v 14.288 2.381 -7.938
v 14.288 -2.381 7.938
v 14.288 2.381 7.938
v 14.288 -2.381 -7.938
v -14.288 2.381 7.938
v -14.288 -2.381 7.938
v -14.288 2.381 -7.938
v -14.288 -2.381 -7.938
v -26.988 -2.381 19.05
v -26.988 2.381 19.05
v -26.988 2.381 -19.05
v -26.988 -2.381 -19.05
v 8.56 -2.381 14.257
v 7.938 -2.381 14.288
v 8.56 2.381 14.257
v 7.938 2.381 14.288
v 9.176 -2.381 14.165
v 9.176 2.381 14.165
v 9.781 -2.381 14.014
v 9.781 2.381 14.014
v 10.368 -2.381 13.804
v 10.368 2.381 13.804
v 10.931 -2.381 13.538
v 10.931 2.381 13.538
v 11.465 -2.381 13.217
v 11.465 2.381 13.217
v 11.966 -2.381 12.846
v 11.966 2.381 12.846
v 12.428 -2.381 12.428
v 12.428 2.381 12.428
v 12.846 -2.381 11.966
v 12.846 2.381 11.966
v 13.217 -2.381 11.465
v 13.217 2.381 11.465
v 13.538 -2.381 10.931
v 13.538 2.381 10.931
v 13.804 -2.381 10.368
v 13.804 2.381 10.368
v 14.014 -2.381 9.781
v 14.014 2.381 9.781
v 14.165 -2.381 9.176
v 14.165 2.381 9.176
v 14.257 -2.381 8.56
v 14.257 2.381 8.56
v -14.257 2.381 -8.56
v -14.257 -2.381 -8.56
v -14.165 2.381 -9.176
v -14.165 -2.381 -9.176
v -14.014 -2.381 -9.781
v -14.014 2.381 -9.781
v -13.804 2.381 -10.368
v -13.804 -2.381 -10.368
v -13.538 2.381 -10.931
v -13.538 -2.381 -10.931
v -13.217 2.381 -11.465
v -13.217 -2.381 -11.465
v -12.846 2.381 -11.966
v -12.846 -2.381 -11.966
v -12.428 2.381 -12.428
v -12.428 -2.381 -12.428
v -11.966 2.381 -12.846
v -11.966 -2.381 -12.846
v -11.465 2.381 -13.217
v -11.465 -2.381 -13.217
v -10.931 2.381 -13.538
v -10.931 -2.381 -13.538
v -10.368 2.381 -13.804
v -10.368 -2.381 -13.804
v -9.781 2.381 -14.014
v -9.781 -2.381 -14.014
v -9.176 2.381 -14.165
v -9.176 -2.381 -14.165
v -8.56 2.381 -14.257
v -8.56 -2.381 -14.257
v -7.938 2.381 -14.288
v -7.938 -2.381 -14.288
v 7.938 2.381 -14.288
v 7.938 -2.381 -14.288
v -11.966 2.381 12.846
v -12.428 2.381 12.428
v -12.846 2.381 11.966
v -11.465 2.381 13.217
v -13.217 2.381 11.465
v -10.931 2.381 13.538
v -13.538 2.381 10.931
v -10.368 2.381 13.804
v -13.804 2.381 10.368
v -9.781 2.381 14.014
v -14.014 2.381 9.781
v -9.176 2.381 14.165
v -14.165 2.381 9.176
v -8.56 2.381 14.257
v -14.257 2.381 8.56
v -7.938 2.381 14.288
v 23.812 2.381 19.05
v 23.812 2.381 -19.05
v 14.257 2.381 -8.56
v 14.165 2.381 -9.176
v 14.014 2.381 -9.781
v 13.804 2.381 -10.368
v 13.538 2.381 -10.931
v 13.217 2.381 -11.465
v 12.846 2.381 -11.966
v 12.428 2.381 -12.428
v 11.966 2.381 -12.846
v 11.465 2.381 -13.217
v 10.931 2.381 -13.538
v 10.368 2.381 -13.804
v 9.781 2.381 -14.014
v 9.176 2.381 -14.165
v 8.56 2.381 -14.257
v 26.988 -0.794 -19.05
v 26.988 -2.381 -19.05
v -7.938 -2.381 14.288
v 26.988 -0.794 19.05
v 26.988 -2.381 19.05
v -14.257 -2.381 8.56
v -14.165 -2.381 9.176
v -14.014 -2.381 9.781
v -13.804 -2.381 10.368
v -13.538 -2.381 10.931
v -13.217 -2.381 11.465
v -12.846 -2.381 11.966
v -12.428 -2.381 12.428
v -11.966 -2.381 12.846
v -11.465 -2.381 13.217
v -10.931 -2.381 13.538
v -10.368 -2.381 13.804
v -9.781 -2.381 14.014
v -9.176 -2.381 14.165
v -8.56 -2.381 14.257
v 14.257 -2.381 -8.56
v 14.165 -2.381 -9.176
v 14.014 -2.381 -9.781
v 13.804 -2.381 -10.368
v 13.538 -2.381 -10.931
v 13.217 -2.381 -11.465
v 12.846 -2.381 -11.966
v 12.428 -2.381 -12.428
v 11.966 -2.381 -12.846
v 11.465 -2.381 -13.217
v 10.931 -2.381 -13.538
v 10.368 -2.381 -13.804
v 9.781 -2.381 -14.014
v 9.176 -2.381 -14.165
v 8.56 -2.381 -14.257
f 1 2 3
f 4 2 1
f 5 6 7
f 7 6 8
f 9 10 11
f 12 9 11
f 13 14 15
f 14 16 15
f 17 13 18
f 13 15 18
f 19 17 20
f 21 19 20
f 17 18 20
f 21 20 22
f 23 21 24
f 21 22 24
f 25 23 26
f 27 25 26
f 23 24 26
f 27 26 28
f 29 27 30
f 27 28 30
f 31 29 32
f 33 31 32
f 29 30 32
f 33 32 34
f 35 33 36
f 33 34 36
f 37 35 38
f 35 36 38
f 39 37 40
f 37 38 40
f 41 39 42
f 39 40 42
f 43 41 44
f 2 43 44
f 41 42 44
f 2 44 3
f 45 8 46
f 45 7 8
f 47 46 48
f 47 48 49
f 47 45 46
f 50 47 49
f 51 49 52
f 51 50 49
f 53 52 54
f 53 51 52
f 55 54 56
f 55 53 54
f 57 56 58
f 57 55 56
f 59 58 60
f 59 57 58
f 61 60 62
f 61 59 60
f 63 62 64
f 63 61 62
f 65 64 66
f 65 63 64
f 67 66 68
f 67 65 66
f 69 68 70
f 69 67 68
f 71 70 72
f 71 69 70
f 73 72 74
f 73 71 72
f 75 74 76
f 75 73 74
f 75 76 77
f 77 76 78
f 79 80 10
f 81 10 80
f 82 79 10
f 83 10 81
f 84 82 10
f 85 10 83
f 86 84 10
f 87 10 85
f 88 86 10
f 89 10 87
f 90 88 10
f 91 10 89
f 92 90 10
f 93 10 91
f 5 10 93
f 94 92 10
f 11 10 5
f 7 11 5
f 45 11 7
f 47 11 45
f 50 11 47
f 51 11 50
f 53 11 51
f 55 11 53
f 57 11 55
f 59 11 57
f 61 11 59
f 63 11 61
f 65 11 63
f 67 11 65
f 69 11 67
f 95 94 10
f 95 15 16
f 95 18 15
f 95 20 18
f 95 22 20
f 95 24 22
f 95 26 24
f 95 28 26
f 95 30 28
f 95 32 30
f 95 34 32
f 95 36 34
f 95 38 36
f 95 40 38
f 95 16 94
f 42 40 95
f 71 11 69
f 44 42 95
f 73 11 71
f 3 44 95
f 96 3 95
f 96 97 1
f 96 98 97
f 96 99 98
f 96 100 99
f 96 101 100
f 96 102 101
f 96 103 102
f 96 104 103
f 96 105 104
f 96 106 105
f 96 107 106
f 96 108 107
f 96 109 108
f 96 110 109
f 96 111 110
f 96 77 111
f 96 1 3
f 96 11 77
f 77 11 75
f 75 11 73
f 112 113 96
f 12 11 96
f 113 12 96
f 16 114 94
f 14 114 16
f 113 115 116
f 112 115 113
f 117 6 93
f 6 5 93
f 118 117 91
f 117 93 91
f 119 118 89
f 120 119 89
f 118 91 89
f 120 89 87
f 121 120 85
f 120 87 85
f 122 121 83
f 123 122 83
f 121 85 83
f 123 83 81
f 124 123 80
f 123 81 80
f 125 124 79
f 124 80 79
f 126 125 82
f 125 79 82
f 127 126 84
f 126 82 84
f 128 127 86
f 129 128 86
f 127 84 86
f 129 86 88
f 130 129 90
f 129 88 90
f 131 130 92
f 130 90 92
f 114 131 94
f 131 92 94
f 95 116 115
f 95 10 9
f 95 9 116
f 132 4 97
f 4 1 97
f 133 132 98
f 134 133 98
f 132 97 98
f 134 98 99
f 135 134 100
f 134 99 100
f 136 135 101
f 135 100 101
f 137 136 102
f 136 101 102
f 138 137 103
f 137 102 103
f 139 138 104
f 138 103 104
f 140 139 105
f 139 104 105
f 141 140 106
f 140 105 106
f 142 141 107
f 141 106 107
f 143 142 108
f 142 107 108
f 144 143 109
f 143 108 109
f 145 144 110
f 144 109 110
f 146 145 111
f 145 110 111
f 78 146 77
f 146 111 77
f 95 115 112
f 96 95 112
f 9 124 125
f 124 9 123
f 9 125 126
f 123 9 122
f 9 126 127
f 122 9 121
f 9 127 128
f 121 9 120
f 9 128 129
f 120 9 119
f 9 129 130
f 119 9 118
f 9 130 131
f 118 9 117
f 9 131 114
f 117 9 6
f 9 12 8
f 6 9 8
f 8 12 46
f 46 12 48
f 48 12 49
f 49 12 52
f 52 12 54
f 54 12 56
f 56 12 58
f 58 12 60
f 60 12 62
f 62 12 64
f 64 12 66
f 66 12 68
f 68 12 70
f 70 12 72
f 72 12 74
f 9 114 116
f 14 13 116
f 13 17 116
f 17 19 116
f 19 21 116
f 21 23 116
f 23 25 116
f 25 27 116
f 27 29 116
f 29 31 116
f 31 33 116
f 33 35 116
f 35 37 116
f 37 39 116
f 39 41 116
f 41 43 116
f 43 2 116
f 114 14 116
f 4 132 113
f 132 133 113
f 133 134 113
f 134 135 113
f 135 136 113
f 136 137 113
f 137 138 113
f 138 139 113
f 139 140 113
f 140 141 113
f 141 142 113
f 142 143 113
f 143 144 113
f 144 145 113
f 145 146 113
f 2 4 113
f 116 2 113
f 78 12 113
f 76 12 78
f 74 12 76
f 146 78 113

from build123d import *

# Parameters (mm, degrees)
SKETCH1_W               = 53.975
SKETCH1_H               = 38.1
BOSS_EXTRUDE1_DEPTH     = 2.38125
CHAMFER1_SIZE           = 3.175
CUT_EXTRUDE1_DEPTH      = 34.375276216
CUT_EXTRUDE1_DEPTH_BACK = 34.375276216
SKETCH4_W               = 28.575
SKETCH4_H               = 28.575
FILLET1_R               = 6.35


with BuildPart() as part:
    # Sketch1 → Boss-Extrude1 (new, symmetric)
    with BuildSketch(Plane(origin=(0, 0, 0), x_dir=(1, 0, 0), z_dir=(0, 1, 0))):
        Rectangle(SKETCH1_W, SKETCH1_H)
    extrude(amount=BOSS_EXTRUDE1_DEPTH, both=True)

    # Chamfer1
    chamfer1_edges = [part.edges().sort_by_distance(p)[0] for p in [
        (26.9875, 2.38125, 0),
    ]]
    chamfer(chamfer1_edges, length=CHAMFER1_SIZE)

    # Sketch4 → Cut-Extrude1 (cut, two sides: drawn at the far end of the back side and taken through both)
    with BuildSketch(Plane(origin=(0, 2.38125, 0), x_dir=(1, 0, 0), z_dir=(0, 1, 0)).offset(-CUT_EXTRUDE1_DEPTH_BACK)):
        Rectangle(SKETCH4_W, SKETCH4_H)
    extrude(amount=CUT_EXTRUDE1_DEPTH + CUT_EXTRUDE1_DEPTH_BACK, mode=Mode.SUBTRACT)

    # Fillet1
    fillet1_edges = [part.edges().sort_by_distance(p)[0] for p in [
        (-14.2875, 0, 14.2875),
        (-14.2875, 0, -14.2875),
        (14.2875, 0, -14.2875),
        (14.2875, 0, 14.2875),
    ]]
    fillet(fillet1_edges, radius=FILLET1_R)


solid = part.part
